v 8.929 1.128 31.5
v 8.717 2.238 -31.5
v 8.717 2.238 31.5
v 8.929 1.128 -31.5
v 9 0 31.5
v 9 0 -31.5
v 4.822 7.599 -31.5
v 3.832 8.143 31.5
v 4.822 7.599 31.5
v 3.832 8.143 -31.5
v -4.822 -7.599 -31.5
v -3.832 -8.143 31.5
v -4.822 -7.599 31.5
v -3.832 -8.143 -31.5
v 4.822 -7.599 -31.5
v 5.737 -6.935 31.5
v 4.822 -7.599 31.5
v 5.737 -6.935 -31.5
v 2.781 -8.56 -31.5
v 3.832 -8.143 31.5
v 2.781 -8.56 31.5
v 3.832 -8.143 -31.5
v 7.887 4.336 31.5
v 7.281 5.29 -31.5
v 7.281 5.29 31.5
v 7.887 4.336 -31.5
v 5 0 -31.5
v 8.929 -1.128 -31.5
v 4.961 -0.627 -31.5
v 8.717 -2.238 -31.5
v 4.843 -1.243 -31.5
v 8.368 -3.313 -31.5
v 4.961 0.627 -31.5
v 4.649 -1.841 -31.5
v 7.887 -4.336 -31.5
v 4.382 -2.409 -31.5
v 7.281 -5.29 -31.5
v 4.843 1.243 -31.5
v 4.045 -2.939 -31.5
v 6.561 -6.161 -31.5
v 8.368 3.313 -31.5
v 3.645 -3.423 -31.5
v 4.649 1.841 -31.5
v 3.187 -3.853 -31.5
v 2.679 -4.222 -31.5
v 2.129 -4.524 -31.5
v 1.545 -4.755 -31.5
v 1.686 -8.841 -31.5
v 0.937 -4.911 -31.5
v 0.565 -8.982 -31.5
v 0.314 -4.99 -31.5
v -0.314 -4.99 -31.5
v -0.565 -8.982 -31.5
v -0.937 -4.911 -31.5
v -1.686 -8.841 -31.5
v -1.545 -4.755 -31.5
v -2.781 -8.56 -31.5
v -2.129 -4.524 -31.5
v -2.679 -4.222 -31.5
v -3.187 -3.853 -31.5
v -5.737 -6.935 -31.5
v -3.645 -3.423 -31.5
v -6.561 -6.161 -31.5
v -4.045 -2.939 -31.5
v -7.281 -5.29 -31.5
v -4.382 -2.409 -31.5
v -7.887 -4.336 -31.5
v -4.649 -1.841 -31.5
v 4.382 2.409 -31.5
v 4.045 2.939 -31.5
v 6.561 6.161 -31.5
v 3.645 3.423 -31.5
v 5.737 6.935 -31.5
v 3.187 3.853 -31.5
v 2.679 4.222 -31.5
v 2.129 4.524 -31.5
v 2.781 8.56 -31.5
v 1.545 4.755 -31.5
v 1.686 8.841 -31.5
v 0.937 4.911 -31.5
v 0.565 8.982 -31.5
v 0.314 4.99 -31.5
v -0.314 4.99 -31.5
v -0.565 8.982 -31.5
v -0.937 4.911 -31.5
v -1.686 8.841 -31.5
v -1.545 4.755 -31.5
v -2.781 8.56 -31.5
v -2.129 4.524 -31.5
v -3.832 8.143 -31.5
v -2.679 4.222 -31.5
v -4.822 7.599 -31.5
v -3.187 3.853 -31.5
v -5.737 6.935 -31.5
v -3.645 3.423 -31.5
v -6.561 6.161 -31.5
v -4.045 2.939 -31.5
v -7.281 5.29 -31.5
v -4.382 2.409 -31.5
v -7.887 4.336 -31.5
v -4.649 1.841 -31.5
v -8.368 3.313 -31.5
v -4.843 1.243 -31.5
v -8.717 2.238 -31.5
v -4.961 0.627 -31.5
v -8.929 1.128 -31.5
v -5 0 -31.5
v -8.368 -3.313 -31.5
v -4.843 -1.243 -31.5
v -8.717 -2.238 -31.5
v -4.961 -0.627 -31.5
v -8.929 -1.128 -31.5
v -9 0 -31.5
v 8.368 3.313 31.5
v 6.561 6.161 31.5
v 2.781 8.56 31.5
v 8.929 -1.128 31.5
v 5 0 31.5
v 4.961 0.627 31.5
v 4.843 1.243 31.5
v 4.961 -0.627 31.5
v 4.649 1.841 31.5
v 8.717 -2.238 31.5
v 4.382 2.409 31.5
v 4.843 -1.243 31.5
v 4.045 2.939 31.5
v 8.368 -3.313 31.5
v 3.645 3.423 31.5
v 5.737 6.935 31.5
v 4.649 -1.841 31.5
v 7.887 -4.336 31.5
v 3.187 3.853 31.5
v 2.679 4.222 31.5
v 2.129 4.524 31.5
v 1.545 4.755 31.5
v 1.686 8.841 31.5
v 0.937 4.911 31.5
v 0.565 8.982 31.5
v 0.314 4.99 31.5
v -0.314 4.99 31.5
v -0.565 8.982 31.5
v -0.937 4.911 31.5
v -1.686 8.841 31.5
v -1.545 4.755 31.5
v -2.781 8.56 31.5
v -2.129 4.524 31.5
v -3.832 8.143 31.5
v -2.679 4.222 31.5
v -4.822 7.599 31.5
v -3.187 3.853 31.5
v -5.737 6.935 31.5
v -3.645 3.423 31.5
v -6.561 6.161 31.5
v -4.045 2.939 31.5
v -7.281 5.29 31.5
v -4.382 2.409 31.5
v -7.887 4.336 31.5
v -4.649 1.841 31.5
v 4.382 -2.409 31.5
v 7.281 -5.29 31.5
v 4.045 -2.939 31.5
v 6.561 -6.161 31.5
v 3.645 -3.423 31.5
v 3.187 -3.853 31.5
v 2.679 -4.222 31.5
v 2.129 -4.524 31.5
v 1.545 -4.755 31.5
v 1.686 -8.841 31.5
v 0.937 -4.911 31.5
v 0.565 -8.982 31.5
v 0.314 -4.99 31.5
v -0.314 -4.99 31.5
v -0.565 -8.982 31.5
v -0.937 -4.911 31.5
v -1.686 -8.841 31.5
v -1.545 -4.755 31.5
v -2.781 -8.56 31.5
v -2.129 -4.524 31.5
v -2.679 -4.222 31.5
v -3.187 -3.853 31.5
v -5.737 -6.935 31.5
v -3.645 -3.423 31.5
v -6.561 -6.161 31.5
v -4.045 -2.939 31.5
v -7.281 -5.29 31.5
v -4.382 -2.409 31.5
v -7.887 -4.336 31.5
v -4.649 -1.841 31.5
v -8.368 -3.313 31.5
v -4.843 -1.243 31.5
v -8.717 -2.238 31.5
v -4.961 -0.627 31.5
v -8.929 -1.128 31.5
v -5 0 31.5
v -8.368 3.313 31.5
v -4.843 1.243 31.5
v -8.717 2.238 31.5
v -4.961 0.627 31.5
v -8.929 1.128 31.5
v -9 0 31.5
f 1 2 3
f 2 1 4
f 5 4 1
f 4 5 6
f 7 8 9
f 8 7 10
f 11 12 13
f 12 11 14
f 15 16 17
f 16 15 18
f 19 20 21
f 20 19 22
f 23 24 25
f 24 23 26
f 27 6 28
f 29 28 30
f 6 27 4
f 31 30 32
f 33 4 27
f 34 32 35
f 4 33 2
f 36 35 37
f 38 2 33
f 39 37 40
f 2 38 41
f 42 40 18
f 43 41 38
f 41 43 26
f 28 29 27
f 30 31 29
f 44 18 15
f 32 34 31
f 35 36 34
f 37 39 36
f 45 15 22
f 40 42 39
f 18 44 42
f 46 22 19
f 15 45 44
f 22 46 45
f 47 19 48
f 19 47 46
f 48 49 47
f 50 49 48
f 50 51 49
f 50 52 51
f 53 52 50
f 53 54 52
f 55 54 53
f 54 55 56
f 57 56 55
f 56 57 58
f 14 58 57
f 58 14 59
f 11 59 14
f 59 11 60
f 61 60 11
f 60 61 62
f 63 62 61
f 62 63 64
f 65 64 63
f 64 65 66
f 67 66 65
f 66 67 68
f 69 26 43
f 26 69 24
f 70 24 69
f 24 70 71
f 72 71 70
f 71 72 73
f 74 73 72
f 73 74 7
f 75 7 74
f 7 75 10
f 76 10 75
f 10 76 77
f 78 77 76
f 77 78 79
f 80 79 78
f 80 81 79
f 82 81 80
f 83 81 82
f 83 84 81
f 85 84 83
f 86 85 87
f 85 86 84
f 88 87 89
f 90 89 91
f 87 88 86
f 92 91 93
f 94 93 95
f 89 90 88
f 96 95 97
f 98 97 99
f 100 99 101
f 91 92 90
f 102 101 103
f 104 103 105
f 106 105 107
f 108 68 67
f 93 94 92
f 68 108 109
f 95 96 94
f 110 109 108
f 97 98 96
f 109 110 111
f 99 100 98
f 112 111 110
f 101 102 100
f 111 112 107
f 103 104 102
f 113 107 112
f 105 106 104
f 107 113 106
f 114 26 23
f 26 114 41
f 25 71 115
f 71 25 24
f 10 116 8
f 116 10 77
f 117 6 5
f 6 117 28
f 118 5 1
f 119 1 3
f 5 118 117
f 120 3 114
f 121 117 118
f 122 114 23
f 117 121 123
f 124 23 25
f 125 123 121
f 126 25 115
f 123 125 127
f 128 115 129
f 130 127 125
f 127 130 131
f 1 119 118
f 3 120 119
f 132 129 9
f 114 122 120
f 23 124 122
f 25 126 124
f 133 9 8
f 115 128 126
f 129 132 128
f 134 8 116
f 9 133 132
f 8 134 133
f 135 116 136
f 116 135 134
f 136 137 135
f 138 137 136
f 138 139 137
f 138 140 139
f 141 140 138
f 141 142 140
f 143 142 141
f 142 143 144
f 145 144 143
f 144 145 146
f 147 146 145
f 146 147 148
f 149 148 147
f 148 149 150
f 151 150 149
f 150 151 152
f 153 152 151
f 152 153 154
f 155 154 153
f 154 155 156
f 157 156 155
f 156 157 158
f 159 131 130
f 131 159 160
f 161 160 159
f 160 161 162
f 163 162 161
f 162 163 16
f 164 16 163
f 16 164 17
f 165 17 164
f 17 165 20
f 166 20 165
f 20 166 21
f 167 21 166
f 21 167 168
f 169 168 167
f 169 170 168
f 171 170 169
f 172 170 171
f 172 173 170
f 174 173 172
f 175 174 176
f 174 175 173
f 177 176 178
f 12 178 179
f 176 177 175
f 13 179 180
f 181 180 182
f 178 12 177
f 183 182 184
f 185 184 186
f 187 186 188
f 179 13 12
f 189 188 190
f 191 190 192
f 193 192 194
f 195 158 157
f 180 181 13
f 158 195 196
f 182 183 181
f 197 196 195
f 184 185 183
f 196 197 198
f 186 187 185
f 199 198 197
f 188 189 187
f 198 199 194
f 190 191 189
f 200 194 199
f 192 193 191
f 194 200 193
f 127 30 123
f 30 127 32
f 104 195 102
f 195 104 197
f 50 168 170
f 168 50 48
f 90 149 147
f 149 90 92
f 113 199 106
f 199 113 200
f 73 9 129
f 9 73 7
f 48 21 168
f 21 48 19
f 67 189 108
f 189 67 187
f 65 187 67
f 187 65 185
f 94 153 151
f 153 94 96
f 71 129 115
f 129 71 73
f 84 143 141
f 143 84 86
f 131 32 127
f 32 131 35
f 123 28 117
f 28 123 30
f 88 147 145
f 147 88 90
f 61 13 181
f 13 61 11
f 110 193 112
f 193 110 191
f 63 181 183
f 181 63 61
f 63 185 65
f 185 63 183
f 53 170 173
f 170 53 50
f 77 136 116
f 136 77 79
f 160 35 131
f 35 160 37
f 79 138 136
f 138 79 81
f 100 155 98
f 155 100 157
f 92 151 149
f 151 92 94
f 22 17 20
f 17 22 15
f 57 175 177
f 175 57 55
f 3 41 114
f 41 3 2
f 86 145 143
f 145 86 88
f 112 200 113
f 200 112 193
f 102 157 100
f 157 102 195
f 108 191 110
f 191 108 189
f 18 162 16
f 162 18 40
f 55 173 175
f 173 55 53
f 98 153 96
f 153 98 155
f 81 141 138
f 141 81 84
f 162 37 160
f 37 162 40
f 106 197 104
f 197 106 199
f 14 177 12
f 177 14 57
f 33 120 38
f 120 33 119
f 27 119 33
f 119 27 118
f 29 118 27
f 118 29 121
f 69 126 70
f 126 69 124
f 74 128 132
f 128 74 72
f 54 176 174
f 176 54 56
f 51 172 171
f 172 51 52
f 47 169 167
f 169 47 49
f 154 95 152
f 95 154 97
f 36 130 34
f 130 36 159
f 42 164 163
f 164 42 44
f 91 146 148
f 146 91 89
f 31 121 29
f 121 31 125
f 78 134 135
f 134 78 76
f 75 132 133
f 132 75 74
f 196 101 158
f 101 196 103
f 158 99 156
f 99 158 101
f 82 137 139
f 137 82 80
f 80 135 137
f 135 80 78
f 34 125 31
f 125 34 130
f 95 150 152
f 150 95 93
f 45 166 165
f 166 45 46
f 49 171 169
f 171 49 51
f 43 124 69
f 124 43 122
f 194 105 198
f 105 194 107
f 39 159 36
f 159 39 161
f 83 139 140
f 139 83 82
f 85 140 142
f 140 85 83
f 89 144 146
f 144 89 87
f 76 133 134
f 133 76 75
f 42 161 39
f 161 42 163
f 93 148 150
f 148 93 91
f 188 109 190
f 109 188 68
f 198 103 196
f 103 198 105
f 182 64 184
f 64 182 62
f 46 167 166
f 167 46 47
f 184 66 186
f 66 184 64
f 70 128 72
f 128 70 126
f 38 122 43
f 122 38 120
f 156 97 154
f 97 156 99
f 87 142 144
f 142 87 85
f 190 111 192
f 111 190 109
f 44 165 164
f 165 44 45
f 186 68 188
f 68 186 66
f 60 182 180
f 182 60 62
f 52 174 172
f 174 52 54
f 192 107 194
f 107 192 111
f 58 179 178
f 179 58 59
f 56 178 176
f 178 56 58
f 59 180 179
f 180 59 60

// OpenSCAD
$fn = 50;


difference() {
	union() {
		translate(v = [0, 0, -31.5000000000]) {
			cylinder(h = 63, r = 9.0000000000);
		}
	}
	union() {
		translate(v = [0, 0, -100.0000000000]) {
			cylinder(h = 200, r = 5.0000000000);
		}
	}
}
